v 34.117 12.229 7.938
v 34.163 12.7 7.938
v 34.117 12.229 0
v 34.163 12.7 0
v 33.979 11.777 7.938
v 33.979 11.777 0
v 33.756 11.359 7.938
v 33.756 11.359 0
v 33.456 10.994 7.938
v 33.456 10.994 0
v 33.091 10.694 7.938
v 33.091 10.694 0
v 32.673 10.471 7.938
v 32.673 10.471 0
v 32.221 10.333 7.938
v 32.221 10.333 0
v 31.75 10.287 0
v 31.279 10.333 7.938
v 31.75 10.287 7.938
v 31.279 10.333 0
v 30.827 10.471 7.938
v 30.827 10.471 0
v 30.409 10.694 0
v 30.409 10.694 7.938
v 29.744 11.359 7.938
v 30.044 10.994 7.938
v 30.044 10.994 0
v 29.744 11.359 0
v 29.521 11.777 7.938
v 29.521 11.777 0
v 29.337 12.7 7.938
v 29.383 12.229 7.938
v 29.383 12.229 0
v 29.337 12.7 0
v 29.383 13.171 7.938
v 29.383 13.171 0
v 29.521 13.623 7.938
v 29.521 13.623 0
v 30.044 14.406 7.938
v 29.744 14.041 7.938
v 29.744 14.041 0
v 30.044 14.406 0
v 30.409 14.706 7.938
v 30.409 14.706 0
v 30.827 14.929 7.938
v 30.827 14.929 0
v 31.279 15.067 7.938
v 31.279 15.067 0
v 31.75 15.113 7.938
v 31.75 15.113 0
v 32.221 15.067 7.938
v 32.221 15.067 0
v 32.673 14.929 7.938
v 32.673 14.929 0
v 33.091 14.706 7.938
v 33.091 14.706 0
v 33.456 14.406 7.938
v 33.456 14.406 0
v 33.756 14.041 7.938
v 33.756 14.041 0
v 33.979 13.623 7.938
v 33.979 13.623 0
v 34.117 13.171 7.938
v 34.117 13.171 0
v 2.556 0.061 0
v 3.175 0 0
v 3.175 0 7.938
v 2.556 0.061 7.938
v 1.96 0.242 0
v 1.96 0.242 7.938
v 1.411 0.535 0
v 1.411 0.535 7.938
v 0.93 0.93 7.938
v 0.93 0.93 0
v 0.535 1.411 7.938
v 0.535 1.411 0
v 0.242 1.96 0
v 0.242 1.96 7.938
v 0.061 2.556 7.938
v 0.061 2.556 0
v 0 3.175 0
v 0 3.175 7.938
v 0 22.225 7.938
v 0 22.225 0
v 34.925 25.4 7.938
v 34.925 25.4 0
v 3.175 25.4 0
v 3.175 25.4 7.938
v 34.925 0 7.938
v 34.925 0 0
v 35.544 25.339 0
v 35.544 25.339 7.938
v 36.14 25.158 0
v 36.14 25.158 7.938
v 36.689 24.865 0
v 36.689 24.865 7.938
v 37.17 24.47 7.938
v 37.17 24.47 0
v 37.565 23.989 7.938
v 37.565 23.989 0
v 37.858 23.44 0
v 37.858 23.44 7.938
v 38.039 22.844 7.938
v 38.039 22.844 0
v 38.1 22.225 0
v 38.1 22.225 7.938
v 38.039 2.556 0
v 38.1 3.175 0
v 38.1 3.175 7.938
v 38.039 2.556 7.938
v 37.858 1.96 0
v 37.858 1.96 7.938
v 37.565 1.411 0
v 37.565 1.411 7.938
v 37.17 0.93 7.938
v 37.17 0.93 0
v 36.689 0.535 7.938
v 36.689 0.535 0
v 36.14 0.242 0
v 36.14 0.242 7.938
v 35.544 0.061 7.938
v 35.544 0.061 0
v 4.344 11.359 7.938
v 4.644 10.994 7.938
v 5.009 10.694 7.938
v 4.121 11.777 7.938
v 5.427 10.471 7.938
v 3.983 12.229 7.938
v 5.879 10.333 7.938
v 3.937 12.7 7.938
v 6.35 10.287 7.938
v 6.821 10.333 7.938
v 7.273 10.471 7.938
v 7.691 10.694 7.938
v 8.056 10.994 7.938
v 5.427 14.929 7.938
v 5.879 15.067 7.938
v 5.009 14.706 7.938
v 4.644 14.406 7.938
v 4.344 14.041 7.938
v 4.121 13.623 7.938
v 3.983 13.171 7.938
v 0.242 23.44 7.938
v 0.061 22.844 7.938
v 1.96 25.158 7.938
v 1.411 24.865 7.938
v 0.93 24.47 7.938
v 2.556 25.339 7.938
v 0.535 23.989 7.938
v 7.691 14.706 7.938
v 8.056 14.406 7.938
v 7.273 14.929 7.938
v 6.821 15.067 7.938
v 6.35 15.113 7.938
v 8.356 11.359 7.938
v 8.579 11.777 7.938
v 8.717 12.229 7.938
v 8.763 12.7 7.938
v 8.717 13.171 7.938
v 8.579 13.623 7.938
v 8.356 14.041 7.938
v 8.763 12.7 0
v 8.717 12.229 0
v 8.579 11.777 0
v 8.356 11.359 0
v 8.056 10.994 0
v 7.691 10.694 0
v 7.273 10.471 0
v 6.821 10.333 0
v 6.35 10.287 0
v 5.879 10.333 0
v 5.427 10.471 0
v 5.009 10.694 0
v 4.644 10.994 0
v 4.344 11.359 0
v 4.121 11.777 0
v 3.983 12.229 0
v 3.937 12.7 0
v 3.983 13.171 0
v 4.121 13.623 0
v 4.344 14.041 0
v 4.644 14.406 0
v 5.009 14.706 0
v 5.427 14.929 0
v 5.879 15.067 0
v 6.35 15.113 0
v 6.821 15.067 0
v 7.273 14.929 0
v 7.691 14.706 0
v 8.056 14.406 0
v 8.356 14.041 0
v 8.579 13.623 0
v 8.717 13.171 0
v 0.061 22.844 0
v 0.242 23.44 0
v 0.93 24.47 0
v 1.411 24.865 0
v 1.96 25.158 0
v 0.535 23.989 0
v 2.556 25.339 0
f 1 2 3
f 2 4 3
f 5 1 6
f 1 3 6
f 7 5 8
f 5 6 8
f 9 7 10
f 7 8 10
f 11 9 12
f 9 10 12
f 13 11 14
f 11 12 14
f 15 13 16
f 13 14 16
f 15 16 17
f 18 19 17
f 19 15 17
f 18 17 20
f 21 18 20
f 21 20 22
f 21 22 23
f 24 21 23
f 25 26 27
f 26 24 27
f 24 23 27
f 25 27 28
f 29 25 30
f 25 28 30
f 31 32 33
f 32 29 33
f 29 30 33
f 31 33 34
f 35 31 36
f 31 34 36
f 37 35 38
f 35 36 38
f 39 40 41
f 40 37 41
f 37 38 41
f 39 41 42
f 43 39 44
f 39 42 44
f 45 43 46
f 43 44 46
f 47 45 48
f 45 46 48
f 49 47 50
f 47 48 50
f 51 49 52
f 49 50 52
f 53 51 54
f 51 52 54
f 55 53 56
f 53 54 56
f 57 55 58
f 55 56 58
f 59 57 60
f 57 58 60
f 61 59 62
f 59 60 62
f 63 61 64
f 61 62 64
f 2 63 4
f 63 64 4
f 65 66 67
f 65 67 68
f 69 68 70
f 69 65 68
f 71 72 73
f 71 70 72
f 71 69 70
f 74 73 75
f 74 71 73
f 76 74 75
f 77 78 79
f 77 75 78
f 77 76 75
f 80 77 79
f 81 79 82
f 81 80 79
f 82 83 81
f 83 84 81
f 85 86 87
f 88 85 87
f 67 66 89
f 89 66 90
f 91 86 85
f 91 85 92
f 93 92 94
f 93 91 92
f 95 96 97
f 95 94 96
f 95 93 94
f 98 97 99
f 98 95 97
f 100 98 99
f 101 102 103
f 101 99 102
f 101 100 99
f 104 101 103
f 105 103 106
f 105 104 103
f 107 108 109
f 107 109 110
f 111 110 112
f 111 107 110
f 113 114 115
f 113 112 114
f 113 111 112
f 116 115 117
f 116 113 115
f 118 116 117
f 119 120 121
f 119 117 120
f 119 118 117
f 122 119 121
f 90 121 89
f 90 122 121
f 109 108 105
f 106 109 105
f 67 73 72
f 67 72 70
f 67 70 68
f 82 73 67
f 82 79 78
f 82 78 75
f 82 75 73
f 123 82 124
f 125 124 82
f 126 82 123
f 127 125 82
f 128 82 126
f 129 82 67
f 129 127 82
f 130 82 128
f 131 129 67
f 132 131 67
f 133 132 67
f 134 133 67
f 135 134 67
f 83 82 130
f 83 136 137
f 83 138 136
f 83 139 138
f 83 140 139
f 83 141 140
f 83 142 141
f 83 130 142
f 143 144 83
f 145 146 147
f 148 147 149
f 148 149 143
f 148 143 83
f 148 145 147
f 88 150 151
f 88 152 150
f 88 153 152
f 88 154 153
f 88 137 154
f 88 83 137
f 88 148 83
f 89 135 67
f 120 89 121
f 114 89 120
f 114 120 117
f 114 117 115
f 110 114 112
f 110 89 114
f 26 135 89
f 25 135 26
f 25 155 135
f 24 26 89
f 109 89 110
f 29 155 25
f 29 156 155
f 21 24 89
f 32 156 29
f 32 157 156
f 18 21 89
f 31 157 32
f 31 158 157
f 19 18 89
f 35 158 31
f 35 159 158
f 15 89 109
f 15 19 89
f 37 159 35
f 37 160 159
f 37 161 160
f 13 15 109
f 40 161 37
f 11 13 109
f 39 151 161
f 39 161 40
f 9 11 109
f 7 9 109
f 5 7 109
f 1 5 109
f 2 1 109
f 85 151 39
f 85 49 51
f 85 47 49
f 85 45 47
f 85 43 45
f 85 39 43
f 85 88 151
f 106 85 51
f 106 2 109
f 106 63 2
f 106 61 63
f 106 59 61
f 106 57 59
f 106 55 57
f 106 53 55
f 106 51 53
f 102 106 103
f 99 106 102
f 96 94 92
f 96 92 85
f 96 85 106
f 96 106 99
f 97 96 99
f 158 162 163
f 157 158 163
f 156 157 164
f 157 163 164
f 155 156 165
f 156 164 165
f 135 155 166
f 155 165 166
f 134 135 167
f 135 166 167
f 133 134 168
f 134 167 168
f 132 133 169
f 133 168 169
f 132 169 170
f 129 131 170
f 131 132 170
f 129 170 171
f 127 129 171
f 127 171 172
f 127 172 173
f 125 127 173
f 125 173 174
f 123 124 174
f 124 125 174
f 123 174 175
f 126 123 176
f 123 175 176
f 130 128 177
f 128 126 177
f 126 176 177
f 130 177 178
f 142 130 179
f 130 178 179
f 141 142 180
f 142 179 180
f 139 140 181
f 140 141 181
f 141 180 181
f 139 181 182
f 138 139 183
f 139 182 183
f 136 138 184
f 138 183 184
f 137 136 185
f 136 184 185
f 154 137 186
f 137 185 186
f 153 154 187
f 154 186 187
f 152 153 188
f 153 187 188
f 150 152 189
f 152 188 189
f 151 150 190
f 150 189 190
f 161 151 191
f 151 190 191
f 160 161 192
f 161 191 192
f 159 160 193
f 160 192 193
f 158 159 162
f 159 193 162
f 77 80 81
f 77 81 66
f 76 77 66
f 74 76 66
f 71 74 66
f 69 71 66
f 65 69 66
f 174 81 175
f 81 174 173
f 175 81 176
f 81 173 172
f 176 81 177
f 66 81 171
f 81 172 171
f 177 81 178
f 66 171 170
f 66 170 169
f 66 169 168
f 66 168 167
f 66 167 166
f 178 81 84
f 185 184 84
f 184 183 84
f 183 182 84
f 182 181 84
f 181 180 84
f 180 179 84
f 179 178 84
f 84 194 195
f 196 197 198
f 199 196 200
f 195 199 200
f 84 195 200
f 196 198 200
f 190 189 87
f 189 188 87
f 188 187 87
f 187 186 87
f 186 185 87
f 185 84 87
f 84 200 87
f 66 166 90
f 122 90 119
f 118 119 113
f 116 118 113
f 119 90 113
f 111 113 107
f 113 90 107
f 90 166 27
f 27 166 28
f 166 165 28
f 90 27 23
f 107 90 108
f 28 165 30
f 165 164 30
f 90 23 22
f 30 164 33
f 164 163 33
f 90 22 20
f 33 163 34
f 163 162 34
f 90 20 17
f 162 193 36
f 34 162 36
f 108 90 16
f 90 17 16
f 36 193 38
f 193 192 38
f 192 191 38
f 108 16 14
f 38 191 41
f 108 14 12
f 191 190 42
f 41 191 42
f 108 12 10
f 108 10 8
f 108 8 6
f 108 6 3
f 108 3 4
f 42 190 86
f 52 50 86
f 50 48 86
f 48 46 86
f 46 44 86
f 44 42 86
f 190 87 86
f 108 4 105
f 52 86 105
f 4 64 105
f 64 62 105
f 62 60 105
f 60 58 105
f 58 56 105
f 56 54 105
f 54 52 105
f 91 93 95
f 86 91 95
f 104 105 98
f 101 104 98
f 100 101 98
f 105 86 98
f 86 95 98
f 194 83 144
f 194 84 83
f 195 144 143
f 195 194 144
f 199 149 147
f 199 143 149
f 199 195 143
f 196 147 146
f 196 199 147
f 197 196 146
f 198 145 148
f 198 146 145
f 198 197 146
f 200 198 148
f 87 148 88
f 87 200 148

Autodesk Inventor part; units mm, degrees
ref_plane "YZ Plane" through (0, 0, 0) normal (1, 0, 0) x (0, 1, 0)
ref_plane "XZ Plane" through (0, 0, 0) normal (0, 1, 0) x (-1, 0, 0)
ref_plane "XY Plane" through (0, 0, 0) normal (0, 0, 1) x (1, 0, 0)
sketch "Sketch1" plane through (0, 0, 0) normal (0, 0, 1) x (1, 0, 0)
  line L0 (3.175, 0) -> (34.925, 0)
  line L1 (38.1, 3.175) -> (38.1, 22.225)
  line L2 (34.925, 25.4) -> (3.175, 25.4)
  line L3 (0, 22.225) -> (0, 3.175)
  circle A0 centre (6.35, 12.7) radius 2.413
  circle A1 centre (31.75, 12.7) radius 2.413
  line L4 (0, 12.7) -> (38.1, 12.7) construction
  arc A2 (3.175, 25.4) -> (0, 22.225) centre (3.175, 22.225) ccw
  arc A3 (38.1, 22.225) -> (34.925, 25.4) centre (34.925, 22.225) ccw
  arc A4 (34.925, 0) -> (38.1, 3.175) centre (34.925, 3.175) ccw
  arc A5 (0, 3.175) -> (3.175, 0) centre (3.175, 3.175) ccw
  point P0 (0, 0)
  point P1 (38.1, 25.4)
  point P2 (38.1, 0)
  point P3 (0, 25.4)
  dimension "d0" = 38.1
  dimension "d1" = 25.4
  dimension "d2" = 4.826
  dimension "d3" = 6.35
  dimension "d7" = 25.4
  dimension "d20" = 3.175
extrude "Extrusion1" add sketch "Sketch1" along normal blind 7.9375
properties part number "Bearing Mount Spacer 1-8in" material "ABS Plastic"
